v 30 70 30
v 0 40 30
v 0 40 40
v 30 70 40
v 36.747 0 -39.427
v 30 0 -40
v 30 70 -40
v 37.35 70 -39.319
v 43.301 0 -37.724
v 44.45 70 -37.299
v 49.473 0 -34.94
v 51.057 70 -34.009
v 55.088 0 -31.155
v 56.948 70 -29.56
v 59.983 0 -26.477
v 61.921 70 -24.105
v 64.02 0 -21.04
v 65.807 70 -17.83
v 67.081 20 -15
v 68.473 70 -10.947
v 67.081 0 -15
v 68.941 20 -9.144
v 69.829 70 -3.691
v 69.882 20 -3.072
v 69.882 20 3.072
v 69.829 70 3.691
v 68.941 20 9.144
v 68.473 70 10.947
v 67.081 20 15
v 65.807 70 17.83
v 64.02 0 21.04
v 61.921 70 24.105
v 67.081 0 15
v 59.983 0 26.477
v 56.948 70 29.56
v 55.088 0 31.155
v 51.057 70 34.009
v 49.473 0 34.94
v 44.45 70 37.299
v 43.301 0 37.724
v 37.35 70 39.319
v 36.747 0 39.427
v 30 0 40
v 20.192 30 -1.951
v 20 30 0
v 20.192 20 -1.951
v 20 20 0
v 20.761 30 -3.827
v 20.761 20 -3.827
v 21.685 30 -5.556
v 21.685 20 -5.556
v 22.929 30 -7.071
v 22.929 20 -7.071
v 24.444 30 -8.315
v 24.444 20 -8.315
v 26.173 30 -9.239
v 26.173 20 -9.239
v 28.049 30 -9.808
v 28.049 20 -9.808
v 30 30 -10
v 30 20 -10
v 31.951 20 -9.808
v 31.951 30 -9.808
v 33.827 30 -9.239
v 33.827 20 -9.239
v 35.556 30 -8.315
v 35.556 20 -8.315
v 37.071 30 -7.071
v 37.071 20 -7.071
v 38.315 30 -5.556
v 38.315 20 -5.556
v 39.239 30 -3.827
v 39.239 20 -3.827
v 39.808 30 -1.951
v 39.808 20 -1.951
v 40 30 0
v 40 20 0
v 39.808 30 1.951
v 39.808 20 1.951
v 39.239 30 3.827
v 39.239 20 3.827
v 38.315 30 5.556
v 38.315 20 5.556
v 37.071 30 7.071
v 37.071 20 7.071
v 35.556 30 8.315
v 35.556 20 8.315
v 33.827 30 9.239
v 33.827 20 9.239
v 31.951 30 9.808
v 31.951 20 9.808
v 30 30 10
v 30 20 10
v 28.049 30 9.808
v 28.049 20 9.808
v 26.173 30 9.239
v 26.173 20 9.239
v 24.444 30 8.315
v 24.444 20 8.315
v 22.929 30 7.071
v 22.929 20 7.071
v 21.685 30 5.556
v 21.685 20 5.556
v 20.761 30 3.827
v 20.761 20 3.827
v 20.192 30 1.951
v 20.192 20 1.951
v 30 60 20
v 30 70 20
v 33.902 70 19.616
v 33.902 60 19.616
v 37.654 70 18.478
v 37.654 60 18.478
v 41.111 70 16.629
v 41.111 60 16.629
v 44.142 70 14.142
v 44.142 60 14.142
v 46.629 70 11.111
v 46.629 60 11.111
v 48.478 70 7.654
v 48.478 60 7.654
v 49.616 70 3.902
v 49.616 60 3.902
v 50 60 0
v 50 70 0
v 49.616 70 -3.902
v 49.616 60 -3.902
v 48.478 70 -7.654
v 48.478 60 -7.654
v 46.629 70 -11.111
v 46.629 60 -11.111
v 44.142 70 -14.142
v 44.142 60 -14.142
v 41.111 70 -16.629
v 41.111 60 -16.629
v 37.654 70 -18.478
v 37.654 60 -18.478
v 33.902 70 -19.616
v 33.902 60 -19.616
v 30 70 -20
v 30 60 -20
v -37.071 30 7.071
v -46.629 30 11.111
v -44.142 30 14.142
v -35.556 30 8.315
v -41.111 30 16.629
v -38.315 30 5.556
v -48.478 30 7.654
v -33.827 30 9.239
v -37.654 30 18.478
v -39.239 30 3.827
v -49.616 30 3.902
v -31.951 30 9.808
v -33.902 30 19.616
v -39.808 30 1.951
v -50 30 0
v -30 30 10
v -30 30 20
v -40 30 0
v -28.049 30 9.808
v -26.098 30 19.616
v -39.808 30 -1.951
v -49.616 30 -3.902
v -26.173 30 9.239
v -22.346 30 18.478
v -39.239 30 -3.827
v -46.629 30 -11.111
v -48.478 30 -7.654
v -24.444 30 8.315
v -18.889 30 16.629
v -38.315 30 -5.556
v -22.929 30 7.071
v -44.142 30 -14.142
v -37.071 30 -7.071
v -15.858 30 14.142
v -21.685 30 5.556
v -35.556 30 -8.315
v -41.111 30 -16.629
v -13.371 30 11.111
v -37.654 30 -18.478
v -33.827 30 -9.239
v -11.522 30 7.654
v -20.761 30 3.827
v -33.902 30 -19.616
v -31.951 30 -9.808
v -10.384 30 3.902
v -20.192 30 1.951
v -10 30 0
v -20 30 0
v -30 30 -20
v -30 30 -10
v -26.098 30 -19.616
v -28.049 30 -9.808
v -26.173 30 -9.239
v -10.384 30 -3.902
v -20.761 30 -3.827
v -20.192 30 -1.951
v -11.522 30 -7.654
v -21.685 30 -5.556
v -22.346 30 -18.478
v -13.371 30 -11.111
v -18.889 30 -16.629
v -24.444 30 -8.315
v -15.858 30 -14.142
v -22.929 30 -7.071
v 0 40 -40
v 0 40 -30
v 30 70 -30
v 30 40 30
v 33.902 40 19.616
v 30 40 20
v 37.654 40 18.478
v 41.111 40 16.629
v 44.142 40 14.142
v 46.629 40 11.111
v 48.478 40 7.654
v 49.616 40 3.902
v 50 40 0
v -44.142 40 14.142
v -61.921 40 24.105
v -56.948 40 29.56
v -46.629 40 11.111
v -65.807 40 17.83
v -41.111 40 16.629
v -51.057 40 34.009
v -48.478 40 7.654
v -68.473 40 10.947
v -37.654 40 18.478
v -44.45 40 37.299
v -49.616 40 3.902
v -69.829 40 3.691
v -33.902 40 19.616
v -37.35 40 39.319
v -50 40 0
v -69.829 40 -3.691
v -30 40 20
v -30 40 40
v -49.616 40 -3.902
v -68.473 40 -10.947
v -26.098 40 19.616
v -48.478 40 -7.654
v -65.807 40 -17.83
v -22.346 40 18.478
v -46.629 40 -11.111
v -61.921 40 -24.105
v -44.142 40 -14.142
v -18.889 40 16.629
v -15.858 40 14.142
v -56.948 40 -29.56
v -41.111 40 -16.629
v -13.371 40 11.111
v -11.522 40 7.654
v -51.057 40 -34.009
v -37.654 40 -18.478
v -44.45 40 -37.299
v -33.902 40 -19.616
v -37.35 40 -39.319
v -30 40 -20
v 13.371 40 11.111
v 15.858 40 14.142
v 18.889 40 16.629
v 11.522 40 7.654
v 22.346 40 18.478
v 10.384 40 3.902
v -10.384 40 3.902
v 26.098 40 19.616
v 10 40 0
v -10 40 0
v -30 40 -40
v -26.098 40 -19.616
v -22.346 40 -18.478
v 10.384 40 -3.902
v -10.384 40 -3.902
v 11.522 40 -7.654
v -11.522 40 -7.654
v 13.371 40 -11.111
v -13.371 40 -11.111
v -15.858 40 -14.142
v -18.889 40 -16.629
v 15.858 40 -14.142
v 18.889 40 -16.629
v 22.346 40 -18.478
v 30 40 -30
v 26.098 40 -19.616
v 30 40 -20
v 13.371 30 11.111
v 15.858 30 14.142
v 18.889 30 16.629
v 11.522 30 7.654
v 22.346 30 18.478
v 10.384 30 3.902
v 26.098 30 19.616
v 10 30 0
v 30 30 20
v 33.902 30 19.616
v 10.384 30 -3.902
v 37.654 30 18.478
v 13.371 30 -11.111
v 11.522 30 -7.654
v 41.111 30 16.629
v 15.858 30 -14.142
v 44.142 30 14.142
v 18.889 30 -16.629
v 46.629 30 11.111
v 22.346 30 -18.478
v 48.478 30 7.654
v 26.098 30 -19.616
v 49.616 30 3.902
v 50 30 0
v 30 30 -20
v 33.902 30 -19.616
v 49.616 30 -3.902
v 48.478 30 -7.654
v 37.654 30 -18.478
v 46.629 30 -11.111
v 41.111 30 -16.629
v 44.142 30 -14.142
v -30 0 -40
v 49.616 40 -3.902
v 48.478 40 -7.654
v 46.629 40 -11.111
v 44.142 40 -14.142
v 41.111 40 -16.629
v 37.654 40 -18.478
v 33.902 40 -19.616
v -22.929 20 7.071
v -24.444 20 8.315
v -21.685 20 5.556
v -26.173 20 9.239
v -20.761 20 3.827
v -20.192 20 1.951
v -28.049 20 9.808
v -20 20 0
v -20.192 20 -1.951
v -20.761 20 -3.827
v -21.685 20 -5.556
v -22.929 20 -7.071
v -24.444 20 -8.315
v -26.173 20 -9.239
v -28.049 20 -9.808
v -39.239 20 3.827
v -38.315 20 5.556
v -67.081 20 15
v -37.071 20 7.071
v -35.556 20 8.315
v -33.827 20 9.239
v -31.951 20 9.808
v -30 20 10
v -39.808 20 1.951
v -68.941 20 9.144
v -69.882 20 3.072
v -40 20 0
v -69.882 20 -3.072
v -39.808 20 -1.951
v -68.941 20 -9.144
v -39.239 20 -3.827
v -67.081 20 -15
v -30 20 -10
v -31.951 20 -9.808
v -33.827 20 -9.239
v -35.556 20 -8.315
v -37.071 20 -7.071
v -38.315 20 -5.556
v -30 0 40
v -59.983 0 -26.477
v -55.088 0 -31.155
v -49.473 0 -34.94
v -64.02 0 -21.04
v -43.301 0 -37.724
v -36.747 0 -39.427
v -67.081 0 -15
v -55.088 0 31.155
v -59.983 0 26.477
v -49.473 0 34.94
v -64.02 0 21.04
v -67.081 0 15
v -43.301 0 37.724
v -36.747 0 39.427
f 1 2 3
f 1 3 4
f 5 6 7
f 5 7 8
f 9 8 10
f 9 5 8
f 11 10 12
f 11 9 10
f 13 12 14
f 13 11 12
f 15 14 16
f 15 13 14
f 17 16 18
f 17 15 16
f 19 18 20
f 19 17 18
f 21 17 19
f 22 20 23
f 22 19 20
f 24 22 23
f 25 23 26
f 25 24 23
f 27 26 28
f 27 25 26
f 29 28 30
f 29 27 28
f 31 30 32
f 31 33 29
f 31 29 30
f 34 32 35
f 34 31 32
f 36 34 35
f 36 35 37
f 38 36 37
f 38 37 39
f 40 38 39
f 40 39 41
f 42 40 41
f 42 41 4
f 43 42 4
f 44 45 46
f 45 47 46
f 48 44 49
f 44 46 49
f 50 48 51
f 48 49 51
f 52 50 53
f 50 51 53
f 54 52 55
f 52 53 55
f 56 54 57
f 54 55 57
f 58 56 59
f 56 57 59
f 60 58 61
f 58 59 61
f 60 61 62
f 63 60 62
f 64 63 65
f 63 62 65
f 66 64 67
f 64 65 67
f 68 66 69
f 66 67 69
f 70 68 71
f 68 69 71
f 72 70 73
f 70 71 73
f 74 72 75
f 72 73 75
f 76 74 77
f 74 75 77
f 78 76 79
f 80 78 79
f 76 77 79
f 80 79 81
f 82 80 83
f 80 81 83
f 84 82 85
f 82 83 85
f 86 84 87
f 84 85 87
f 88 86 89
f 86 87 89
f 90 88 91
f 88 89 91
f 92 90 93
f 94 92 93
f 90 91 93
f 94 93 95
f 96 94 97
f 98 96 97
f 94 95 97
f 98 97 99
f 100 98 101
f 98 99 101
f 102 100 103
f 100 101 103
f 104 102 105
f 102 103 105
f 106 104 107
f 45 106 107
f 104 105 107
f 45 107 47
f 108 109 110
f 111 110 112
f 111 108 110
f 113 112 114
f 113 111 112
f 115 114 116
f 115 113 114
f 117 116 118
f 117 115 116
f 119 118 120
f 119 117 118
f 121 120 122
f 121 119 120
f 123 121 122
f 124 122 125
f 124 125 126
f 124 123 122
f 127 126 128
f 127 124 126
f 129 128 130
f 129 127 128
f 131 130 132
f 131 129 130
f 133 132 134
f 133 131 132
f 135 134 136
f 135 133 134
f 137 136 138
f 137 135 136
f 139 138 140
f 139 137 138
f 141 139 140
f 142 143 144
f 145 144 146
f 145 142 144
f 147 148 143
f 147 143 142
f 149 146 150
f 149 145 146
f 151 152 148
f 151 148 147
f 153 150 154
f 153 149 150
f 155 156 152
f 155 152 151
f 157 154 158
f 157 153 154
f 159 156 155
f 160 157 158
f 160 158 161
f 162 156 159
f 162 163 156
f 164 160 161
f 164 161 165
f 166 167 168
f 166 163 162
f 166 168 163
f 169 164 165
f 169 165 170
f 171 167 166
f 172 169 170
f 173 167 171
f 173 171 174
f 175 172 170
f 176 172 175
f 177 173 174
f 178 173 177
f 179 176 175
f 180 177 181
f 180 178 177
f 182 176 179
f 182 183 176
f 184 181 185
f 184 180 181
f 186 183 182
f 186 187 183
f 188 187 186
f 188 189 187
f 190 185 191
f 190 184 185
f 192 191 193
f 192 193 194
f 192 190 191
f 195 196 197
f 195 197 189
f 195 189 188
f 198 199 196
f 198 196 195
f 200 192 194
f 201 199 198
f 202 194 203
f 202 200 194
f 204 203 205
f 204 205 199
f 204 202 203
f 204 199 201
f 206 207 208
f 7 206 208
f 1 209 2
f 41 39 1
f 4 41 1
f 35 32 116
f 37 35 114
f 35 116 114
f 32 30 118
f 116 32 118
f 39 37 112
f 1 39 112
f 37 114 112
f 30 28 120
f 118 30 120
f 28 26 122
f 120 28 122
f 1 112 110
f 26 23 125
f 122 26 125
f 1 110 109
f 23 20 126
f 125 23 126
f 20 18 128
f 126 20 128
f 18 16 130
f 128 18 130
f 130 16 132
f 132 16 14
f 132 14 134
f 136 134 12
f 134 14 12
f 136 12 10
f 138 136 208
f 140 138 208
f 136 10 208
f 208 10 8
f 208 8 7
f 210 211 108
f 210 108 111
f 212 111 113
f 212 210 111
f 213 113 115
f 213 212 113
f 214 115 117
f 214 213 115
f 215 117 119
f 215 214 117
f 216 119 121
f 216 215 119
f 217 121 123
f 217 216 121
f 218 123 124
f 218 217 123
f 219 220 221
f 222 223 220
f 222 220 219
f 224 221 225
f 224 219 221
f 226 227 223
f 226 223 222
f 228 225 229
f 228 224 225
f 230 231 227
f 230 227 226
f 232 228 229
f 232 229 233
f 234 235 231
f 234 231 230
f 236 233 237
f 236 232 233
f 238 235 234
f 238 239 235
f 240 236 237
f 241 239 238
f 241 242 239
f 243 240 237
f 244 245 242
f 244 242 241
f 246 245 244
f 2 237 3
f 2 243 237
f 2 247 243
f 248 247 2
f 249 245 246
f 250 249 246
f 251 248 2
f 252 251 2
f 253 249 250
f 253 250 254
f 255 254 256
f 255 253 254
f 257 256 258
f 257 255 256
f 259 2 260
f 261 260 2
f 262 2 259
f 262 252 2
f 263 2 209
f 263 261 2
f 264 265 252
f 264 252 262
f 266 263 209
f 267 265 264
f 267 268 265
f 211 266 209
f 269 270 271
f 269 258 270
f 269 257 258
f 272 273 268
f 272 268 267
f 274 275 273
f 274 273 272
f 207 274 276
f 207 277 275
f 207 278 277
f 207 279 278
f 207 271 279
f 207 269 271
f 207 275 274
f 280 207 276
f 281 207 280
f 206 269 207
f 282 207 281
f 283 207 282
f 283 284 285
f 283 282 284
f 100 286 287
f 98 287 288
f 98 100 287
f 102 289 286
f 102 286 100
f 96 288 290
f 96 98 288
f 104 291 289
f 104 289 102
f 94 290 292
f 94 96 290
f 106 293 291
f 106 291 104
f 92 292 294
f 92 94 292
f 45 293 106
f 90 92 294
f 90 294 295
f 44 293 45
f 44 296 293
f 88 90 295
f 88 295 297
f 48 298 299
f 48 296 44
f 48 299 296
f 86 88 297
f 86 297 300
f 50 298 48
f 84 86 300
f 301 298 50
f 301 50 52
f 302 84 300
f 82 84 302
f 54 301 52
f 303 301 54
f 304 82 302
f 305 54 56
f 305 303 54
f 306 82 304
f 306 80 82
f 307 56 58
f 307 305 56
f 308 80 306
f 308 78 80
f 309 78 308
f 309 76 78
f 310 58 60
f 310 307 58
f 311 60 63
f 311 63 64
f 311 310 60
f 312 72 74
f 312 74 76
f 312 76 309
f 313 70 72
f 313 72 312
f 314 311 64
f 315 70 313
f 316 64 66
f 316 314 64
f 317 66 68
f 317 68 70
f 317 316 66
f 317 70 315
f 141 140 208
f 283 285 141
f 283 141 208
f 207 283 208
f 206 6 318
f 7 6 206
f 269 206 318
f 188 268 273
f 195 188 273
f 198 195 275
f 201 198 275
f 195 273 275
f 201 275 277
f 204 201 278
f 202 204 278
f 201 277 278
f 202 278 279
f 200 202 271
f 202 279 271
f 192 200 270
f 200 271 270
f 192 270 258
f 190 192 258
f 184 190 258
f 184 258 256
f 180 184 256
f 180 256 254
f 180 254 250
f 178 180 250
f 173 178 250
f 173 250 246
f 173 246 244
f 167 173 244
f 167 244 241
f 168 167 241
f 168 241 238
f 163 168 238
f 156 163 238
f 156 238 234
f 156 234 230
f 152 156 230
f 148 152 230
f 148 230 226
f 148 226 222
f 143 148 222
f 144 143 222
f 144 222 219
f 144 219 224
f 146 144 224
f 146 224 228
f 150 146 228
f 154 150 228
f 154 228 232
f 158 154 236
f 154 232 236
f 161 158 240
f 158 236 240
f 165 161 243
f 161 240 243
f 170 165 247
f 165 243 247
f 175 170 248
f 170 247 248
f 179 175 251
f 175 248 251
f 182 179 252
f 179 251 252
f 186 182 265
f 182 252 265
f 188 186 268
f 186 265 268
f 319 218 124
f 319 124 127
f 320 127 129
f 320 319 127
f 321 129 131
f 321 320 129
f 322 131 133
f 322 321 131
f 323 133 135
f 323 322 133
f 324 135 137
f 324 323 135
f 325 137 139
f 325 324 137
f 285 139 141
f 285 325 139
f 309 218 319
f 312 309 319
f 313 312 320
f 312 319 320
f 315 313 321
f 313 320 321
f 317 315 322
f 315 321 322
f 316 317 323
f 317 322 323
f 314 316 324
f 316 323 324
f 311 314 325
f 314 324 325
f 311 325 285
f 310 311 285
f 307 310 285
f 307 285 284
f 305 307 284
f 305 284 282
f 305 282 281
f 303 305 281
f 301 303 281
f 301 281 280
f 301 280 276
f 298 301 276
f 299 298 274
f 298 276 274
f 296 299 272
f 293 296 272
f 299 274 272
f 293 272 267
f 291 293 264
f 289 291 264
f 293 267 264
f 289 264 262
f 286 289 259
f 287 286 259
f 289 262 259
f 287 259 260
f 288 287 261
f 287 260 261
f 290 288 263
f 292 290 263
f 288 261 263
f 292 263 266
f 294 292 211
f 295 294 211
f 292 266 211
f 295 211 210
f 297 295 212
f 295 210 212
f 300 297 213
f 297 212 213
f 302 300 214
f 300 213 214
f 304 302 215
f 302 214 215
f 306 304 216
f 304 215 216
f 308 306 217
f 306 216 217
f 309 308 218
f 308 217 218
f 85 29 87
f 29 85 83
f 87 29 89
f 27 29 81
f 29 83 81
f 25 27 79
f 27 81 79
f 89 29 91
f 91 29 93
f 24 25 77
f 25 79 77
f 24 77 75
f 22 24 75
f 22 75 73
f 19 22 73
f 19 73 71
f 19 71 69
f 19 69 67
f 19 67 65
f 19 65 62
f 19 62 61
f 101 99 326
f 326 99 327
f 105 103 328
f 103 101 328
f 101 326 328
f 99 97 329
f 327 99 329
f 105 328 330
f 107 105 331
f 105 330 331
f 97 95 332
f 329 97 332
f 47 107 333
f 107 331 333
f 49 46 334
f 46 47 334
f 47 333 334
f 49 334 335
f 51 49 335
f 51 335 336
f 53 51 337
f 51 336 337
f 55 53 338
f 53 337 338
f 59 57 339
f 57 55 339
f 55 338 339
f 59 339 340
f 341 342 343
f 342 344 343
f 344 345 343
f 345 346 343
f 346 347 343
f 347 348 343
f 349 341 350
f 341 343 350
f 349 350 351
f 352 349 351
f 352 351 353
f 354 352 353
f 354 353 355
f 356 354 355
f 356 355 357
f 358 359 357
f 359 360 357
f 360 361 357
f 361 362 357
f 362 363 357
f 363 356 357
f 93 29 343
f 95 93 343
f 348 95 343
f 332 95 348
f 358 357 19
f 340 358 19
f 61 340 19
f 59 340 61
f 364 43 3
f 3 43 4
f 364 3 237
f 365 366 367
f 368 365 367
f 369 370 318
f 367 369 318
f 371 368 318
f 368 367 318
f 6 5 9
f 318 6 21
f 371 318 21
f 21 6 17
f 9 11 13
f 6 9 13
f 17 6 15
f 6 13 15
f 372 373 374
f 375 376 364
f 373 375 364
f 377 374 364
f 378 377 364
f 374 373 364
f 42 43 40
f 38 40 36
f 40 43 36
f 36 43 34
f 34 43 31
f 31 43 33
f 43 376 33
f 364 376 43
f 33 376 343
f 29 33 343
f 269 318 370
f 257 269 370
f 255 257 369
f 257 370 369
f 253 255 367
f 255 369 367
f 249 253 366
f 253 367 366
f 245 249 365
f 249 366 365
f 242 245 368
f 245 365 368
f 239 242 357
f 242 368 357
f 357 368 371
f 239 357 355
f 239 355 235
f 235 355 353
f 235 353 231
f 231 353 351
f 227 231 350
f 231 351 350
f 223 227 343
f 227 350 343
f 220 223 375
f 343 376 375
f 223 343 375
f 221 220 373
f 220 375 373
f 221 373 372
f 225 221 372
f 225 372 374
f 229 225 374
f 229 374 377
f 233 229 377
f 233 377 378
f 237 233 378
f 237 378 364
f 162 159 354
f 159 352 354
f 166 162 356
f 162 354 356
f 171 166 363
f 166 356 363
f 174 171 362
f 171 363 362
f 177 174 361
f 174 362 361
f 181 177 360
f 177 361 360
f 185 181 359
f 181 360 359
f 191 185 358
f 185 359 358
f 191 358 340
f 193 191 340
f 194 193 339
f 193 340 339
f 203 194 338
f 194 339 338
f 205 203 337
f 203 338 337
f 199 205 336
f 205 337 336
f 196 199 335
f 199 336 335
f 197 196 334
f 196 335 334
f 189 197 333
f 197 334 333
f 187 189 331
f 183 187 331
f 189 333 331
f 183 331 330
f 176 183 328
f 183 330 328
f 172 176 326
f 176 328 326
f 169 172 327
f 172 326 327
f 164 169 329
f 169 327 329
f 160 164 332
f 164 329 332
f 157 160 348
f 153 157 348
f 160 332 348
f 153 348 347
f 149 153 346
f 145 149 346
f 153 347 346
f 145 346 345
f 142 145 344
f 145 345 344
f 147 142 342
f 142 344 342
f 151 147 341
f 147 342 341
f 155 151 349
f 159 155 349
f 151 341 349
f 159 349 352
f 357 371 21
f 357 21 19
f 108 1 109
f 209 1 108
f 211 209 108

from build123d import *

# Parameters (mm, degrees)
BOSS_EXTRUDE1_DEPTH                     = 40
BOSS_EXTRUDE2_DEPTH                     = 70
RIB7_START                              = -10
RIB7_DEPTH                              = 10
CUT_EXTRUDE1_DEPTH                      = 107.77078252
CUT_EXTRUDE1_DEPTH_BACK                 = 107.77078252
SKETCH3_W                               = 30
SKETCH3_H                               = 20
CBORE_FOR_M5_HEX_HEAD_BOLT1_D           = 20
CBORE_FOR_M5_HEX_HEAD_BOLT1_DEPTH       = 20
CBORE_FOR_M5_HEX_HEAD_BOLT1_CBORE_D     = 40
CBORE_FOR_M5_HEX_HEAD_BOLT1_CBORE_DEPTH = 10
CBORE_FOR_M5_HEX_HEAD_BOLT1_TIP         = 5.773502692


# Read off the part's stored shape, not the designer's step: Rib7
with BuildPart() as part:
    # Sketch1 → Boss-Extrude1 (new body)
    with BuildSketch(Plane(origin=(0, 0, 0), x_dir=(1, 0, 0), z_dir=(0, 1, 0))):
        with BuildLine():
            Line((30, -40), (30, -20))
            ThreePointArc((30, -20), (50, 0), (30, 20))
            Line((30, 20), (30, 40))
            Line((30, 40), (-30, 40))
            ThreePointArc((-30, 40), (-70, 0), (-30, -40))
            Line((-30, -40), (30, -40))
        make_face()
        with BuildLine():
            ThreePointArc((30, -20), (50, 0), (30, 20))
            Line((30, 20), (30, 40))
            ThreePointArc((30, 40), (70, 0), (30, -40))
            Line((30, -40), (30, -20))
        make_face()
    extrude(amount=BOSS_EXTRUDE1_DEPTH)

    # Sketch1<3> → Boss-Extrude2 (add)
    with BuildSketch(Plane(origin=(0, 0, 0), x_dir=(1, 0, 0), z_dir=(0, 1, 0))):
        with BuildLine():
            ThreePointArc((30, -20), (50, 0), (30, 20))
            Line((30, 20), (30, 40))
            ThreePointArc((30, 40), (70, 0), (30, -40))
            Line((30, -40), (30, -20))
        make_face()
    extrude(amount=BOSS_EXTRUDE2_DEPTH)

    # Rib7 outline → Rib7 (add)
    with BuildSketch(Plane(origin=(0, 0, -40), x_dir=(-1, 0, 0), z_dir=(0, 0, -1)).offset(RIB7_START)):
        Polygon((0, 40), (-30, 70), (-30, 40), align=None)
    rib7 = extrude(amount=RIB7_DEPTH)

    # Mirror1: Rib7 across plane
    add(rib7.mirror(Plane.XY))

    # Sketch3 → Cut-Extrude1 (cut, two sides: drawn at the far end of the back side and taken through both)
    with BuildSketch(Plane(origin=(0, 0, 0), x_dir=(0, 0, -1), z_dir=(1, 0, 0)).offset(-CUT_EXTRUDE1_DEPTH_BACK)):
        with Locations((0, 10)):
            Rectangle(SKETCH3_W, SKETCH3_H)
    extrude(amount=CUT_EXTRUDE1_DEPTH + CUT_EXTRUDE1_DEPTH_BACK, mode=Mode.SUBTRACT)

    # CBORE for M5 Hex Head Bolt1
    with Locations(Plane(origin=(0, 40, 0), x_dir=(1, 0, 0), z_dir=(0, 1, 0))):
        with Locations((30, 0), (-30, 0)):
            CounterBoreHole(CBORE_FOR_M5_HEX_HEAD_BOLT1_D / 2, CBORE_FOR_M5_HEX_HEAD_BOLT1_CBORE_D / 2, CBORE_FOR_M5_HEX_HEAD_BOLT1_CBORE_DEPTH, depth=CBORE_FOR_M5_HEX_HEAD_BOLT1_DEPTH)
            with Locations((0, 0, -(CBORE_FOR_M5_HEX_HEAD_BOLT1_DEPTH + CBORE_FOR_M5_HEX_HEAD_BOLT1_TIP / 2))):  # 120° drill point
                Cone(0, CBORE_FOR_M5_HEX_HEAD_BOLT1_D / 2, CBORE_FOR_M5_HEX_HEAD_BOLT1_TIP, mode=Mode.SUBTRACT)


solid = part.part
